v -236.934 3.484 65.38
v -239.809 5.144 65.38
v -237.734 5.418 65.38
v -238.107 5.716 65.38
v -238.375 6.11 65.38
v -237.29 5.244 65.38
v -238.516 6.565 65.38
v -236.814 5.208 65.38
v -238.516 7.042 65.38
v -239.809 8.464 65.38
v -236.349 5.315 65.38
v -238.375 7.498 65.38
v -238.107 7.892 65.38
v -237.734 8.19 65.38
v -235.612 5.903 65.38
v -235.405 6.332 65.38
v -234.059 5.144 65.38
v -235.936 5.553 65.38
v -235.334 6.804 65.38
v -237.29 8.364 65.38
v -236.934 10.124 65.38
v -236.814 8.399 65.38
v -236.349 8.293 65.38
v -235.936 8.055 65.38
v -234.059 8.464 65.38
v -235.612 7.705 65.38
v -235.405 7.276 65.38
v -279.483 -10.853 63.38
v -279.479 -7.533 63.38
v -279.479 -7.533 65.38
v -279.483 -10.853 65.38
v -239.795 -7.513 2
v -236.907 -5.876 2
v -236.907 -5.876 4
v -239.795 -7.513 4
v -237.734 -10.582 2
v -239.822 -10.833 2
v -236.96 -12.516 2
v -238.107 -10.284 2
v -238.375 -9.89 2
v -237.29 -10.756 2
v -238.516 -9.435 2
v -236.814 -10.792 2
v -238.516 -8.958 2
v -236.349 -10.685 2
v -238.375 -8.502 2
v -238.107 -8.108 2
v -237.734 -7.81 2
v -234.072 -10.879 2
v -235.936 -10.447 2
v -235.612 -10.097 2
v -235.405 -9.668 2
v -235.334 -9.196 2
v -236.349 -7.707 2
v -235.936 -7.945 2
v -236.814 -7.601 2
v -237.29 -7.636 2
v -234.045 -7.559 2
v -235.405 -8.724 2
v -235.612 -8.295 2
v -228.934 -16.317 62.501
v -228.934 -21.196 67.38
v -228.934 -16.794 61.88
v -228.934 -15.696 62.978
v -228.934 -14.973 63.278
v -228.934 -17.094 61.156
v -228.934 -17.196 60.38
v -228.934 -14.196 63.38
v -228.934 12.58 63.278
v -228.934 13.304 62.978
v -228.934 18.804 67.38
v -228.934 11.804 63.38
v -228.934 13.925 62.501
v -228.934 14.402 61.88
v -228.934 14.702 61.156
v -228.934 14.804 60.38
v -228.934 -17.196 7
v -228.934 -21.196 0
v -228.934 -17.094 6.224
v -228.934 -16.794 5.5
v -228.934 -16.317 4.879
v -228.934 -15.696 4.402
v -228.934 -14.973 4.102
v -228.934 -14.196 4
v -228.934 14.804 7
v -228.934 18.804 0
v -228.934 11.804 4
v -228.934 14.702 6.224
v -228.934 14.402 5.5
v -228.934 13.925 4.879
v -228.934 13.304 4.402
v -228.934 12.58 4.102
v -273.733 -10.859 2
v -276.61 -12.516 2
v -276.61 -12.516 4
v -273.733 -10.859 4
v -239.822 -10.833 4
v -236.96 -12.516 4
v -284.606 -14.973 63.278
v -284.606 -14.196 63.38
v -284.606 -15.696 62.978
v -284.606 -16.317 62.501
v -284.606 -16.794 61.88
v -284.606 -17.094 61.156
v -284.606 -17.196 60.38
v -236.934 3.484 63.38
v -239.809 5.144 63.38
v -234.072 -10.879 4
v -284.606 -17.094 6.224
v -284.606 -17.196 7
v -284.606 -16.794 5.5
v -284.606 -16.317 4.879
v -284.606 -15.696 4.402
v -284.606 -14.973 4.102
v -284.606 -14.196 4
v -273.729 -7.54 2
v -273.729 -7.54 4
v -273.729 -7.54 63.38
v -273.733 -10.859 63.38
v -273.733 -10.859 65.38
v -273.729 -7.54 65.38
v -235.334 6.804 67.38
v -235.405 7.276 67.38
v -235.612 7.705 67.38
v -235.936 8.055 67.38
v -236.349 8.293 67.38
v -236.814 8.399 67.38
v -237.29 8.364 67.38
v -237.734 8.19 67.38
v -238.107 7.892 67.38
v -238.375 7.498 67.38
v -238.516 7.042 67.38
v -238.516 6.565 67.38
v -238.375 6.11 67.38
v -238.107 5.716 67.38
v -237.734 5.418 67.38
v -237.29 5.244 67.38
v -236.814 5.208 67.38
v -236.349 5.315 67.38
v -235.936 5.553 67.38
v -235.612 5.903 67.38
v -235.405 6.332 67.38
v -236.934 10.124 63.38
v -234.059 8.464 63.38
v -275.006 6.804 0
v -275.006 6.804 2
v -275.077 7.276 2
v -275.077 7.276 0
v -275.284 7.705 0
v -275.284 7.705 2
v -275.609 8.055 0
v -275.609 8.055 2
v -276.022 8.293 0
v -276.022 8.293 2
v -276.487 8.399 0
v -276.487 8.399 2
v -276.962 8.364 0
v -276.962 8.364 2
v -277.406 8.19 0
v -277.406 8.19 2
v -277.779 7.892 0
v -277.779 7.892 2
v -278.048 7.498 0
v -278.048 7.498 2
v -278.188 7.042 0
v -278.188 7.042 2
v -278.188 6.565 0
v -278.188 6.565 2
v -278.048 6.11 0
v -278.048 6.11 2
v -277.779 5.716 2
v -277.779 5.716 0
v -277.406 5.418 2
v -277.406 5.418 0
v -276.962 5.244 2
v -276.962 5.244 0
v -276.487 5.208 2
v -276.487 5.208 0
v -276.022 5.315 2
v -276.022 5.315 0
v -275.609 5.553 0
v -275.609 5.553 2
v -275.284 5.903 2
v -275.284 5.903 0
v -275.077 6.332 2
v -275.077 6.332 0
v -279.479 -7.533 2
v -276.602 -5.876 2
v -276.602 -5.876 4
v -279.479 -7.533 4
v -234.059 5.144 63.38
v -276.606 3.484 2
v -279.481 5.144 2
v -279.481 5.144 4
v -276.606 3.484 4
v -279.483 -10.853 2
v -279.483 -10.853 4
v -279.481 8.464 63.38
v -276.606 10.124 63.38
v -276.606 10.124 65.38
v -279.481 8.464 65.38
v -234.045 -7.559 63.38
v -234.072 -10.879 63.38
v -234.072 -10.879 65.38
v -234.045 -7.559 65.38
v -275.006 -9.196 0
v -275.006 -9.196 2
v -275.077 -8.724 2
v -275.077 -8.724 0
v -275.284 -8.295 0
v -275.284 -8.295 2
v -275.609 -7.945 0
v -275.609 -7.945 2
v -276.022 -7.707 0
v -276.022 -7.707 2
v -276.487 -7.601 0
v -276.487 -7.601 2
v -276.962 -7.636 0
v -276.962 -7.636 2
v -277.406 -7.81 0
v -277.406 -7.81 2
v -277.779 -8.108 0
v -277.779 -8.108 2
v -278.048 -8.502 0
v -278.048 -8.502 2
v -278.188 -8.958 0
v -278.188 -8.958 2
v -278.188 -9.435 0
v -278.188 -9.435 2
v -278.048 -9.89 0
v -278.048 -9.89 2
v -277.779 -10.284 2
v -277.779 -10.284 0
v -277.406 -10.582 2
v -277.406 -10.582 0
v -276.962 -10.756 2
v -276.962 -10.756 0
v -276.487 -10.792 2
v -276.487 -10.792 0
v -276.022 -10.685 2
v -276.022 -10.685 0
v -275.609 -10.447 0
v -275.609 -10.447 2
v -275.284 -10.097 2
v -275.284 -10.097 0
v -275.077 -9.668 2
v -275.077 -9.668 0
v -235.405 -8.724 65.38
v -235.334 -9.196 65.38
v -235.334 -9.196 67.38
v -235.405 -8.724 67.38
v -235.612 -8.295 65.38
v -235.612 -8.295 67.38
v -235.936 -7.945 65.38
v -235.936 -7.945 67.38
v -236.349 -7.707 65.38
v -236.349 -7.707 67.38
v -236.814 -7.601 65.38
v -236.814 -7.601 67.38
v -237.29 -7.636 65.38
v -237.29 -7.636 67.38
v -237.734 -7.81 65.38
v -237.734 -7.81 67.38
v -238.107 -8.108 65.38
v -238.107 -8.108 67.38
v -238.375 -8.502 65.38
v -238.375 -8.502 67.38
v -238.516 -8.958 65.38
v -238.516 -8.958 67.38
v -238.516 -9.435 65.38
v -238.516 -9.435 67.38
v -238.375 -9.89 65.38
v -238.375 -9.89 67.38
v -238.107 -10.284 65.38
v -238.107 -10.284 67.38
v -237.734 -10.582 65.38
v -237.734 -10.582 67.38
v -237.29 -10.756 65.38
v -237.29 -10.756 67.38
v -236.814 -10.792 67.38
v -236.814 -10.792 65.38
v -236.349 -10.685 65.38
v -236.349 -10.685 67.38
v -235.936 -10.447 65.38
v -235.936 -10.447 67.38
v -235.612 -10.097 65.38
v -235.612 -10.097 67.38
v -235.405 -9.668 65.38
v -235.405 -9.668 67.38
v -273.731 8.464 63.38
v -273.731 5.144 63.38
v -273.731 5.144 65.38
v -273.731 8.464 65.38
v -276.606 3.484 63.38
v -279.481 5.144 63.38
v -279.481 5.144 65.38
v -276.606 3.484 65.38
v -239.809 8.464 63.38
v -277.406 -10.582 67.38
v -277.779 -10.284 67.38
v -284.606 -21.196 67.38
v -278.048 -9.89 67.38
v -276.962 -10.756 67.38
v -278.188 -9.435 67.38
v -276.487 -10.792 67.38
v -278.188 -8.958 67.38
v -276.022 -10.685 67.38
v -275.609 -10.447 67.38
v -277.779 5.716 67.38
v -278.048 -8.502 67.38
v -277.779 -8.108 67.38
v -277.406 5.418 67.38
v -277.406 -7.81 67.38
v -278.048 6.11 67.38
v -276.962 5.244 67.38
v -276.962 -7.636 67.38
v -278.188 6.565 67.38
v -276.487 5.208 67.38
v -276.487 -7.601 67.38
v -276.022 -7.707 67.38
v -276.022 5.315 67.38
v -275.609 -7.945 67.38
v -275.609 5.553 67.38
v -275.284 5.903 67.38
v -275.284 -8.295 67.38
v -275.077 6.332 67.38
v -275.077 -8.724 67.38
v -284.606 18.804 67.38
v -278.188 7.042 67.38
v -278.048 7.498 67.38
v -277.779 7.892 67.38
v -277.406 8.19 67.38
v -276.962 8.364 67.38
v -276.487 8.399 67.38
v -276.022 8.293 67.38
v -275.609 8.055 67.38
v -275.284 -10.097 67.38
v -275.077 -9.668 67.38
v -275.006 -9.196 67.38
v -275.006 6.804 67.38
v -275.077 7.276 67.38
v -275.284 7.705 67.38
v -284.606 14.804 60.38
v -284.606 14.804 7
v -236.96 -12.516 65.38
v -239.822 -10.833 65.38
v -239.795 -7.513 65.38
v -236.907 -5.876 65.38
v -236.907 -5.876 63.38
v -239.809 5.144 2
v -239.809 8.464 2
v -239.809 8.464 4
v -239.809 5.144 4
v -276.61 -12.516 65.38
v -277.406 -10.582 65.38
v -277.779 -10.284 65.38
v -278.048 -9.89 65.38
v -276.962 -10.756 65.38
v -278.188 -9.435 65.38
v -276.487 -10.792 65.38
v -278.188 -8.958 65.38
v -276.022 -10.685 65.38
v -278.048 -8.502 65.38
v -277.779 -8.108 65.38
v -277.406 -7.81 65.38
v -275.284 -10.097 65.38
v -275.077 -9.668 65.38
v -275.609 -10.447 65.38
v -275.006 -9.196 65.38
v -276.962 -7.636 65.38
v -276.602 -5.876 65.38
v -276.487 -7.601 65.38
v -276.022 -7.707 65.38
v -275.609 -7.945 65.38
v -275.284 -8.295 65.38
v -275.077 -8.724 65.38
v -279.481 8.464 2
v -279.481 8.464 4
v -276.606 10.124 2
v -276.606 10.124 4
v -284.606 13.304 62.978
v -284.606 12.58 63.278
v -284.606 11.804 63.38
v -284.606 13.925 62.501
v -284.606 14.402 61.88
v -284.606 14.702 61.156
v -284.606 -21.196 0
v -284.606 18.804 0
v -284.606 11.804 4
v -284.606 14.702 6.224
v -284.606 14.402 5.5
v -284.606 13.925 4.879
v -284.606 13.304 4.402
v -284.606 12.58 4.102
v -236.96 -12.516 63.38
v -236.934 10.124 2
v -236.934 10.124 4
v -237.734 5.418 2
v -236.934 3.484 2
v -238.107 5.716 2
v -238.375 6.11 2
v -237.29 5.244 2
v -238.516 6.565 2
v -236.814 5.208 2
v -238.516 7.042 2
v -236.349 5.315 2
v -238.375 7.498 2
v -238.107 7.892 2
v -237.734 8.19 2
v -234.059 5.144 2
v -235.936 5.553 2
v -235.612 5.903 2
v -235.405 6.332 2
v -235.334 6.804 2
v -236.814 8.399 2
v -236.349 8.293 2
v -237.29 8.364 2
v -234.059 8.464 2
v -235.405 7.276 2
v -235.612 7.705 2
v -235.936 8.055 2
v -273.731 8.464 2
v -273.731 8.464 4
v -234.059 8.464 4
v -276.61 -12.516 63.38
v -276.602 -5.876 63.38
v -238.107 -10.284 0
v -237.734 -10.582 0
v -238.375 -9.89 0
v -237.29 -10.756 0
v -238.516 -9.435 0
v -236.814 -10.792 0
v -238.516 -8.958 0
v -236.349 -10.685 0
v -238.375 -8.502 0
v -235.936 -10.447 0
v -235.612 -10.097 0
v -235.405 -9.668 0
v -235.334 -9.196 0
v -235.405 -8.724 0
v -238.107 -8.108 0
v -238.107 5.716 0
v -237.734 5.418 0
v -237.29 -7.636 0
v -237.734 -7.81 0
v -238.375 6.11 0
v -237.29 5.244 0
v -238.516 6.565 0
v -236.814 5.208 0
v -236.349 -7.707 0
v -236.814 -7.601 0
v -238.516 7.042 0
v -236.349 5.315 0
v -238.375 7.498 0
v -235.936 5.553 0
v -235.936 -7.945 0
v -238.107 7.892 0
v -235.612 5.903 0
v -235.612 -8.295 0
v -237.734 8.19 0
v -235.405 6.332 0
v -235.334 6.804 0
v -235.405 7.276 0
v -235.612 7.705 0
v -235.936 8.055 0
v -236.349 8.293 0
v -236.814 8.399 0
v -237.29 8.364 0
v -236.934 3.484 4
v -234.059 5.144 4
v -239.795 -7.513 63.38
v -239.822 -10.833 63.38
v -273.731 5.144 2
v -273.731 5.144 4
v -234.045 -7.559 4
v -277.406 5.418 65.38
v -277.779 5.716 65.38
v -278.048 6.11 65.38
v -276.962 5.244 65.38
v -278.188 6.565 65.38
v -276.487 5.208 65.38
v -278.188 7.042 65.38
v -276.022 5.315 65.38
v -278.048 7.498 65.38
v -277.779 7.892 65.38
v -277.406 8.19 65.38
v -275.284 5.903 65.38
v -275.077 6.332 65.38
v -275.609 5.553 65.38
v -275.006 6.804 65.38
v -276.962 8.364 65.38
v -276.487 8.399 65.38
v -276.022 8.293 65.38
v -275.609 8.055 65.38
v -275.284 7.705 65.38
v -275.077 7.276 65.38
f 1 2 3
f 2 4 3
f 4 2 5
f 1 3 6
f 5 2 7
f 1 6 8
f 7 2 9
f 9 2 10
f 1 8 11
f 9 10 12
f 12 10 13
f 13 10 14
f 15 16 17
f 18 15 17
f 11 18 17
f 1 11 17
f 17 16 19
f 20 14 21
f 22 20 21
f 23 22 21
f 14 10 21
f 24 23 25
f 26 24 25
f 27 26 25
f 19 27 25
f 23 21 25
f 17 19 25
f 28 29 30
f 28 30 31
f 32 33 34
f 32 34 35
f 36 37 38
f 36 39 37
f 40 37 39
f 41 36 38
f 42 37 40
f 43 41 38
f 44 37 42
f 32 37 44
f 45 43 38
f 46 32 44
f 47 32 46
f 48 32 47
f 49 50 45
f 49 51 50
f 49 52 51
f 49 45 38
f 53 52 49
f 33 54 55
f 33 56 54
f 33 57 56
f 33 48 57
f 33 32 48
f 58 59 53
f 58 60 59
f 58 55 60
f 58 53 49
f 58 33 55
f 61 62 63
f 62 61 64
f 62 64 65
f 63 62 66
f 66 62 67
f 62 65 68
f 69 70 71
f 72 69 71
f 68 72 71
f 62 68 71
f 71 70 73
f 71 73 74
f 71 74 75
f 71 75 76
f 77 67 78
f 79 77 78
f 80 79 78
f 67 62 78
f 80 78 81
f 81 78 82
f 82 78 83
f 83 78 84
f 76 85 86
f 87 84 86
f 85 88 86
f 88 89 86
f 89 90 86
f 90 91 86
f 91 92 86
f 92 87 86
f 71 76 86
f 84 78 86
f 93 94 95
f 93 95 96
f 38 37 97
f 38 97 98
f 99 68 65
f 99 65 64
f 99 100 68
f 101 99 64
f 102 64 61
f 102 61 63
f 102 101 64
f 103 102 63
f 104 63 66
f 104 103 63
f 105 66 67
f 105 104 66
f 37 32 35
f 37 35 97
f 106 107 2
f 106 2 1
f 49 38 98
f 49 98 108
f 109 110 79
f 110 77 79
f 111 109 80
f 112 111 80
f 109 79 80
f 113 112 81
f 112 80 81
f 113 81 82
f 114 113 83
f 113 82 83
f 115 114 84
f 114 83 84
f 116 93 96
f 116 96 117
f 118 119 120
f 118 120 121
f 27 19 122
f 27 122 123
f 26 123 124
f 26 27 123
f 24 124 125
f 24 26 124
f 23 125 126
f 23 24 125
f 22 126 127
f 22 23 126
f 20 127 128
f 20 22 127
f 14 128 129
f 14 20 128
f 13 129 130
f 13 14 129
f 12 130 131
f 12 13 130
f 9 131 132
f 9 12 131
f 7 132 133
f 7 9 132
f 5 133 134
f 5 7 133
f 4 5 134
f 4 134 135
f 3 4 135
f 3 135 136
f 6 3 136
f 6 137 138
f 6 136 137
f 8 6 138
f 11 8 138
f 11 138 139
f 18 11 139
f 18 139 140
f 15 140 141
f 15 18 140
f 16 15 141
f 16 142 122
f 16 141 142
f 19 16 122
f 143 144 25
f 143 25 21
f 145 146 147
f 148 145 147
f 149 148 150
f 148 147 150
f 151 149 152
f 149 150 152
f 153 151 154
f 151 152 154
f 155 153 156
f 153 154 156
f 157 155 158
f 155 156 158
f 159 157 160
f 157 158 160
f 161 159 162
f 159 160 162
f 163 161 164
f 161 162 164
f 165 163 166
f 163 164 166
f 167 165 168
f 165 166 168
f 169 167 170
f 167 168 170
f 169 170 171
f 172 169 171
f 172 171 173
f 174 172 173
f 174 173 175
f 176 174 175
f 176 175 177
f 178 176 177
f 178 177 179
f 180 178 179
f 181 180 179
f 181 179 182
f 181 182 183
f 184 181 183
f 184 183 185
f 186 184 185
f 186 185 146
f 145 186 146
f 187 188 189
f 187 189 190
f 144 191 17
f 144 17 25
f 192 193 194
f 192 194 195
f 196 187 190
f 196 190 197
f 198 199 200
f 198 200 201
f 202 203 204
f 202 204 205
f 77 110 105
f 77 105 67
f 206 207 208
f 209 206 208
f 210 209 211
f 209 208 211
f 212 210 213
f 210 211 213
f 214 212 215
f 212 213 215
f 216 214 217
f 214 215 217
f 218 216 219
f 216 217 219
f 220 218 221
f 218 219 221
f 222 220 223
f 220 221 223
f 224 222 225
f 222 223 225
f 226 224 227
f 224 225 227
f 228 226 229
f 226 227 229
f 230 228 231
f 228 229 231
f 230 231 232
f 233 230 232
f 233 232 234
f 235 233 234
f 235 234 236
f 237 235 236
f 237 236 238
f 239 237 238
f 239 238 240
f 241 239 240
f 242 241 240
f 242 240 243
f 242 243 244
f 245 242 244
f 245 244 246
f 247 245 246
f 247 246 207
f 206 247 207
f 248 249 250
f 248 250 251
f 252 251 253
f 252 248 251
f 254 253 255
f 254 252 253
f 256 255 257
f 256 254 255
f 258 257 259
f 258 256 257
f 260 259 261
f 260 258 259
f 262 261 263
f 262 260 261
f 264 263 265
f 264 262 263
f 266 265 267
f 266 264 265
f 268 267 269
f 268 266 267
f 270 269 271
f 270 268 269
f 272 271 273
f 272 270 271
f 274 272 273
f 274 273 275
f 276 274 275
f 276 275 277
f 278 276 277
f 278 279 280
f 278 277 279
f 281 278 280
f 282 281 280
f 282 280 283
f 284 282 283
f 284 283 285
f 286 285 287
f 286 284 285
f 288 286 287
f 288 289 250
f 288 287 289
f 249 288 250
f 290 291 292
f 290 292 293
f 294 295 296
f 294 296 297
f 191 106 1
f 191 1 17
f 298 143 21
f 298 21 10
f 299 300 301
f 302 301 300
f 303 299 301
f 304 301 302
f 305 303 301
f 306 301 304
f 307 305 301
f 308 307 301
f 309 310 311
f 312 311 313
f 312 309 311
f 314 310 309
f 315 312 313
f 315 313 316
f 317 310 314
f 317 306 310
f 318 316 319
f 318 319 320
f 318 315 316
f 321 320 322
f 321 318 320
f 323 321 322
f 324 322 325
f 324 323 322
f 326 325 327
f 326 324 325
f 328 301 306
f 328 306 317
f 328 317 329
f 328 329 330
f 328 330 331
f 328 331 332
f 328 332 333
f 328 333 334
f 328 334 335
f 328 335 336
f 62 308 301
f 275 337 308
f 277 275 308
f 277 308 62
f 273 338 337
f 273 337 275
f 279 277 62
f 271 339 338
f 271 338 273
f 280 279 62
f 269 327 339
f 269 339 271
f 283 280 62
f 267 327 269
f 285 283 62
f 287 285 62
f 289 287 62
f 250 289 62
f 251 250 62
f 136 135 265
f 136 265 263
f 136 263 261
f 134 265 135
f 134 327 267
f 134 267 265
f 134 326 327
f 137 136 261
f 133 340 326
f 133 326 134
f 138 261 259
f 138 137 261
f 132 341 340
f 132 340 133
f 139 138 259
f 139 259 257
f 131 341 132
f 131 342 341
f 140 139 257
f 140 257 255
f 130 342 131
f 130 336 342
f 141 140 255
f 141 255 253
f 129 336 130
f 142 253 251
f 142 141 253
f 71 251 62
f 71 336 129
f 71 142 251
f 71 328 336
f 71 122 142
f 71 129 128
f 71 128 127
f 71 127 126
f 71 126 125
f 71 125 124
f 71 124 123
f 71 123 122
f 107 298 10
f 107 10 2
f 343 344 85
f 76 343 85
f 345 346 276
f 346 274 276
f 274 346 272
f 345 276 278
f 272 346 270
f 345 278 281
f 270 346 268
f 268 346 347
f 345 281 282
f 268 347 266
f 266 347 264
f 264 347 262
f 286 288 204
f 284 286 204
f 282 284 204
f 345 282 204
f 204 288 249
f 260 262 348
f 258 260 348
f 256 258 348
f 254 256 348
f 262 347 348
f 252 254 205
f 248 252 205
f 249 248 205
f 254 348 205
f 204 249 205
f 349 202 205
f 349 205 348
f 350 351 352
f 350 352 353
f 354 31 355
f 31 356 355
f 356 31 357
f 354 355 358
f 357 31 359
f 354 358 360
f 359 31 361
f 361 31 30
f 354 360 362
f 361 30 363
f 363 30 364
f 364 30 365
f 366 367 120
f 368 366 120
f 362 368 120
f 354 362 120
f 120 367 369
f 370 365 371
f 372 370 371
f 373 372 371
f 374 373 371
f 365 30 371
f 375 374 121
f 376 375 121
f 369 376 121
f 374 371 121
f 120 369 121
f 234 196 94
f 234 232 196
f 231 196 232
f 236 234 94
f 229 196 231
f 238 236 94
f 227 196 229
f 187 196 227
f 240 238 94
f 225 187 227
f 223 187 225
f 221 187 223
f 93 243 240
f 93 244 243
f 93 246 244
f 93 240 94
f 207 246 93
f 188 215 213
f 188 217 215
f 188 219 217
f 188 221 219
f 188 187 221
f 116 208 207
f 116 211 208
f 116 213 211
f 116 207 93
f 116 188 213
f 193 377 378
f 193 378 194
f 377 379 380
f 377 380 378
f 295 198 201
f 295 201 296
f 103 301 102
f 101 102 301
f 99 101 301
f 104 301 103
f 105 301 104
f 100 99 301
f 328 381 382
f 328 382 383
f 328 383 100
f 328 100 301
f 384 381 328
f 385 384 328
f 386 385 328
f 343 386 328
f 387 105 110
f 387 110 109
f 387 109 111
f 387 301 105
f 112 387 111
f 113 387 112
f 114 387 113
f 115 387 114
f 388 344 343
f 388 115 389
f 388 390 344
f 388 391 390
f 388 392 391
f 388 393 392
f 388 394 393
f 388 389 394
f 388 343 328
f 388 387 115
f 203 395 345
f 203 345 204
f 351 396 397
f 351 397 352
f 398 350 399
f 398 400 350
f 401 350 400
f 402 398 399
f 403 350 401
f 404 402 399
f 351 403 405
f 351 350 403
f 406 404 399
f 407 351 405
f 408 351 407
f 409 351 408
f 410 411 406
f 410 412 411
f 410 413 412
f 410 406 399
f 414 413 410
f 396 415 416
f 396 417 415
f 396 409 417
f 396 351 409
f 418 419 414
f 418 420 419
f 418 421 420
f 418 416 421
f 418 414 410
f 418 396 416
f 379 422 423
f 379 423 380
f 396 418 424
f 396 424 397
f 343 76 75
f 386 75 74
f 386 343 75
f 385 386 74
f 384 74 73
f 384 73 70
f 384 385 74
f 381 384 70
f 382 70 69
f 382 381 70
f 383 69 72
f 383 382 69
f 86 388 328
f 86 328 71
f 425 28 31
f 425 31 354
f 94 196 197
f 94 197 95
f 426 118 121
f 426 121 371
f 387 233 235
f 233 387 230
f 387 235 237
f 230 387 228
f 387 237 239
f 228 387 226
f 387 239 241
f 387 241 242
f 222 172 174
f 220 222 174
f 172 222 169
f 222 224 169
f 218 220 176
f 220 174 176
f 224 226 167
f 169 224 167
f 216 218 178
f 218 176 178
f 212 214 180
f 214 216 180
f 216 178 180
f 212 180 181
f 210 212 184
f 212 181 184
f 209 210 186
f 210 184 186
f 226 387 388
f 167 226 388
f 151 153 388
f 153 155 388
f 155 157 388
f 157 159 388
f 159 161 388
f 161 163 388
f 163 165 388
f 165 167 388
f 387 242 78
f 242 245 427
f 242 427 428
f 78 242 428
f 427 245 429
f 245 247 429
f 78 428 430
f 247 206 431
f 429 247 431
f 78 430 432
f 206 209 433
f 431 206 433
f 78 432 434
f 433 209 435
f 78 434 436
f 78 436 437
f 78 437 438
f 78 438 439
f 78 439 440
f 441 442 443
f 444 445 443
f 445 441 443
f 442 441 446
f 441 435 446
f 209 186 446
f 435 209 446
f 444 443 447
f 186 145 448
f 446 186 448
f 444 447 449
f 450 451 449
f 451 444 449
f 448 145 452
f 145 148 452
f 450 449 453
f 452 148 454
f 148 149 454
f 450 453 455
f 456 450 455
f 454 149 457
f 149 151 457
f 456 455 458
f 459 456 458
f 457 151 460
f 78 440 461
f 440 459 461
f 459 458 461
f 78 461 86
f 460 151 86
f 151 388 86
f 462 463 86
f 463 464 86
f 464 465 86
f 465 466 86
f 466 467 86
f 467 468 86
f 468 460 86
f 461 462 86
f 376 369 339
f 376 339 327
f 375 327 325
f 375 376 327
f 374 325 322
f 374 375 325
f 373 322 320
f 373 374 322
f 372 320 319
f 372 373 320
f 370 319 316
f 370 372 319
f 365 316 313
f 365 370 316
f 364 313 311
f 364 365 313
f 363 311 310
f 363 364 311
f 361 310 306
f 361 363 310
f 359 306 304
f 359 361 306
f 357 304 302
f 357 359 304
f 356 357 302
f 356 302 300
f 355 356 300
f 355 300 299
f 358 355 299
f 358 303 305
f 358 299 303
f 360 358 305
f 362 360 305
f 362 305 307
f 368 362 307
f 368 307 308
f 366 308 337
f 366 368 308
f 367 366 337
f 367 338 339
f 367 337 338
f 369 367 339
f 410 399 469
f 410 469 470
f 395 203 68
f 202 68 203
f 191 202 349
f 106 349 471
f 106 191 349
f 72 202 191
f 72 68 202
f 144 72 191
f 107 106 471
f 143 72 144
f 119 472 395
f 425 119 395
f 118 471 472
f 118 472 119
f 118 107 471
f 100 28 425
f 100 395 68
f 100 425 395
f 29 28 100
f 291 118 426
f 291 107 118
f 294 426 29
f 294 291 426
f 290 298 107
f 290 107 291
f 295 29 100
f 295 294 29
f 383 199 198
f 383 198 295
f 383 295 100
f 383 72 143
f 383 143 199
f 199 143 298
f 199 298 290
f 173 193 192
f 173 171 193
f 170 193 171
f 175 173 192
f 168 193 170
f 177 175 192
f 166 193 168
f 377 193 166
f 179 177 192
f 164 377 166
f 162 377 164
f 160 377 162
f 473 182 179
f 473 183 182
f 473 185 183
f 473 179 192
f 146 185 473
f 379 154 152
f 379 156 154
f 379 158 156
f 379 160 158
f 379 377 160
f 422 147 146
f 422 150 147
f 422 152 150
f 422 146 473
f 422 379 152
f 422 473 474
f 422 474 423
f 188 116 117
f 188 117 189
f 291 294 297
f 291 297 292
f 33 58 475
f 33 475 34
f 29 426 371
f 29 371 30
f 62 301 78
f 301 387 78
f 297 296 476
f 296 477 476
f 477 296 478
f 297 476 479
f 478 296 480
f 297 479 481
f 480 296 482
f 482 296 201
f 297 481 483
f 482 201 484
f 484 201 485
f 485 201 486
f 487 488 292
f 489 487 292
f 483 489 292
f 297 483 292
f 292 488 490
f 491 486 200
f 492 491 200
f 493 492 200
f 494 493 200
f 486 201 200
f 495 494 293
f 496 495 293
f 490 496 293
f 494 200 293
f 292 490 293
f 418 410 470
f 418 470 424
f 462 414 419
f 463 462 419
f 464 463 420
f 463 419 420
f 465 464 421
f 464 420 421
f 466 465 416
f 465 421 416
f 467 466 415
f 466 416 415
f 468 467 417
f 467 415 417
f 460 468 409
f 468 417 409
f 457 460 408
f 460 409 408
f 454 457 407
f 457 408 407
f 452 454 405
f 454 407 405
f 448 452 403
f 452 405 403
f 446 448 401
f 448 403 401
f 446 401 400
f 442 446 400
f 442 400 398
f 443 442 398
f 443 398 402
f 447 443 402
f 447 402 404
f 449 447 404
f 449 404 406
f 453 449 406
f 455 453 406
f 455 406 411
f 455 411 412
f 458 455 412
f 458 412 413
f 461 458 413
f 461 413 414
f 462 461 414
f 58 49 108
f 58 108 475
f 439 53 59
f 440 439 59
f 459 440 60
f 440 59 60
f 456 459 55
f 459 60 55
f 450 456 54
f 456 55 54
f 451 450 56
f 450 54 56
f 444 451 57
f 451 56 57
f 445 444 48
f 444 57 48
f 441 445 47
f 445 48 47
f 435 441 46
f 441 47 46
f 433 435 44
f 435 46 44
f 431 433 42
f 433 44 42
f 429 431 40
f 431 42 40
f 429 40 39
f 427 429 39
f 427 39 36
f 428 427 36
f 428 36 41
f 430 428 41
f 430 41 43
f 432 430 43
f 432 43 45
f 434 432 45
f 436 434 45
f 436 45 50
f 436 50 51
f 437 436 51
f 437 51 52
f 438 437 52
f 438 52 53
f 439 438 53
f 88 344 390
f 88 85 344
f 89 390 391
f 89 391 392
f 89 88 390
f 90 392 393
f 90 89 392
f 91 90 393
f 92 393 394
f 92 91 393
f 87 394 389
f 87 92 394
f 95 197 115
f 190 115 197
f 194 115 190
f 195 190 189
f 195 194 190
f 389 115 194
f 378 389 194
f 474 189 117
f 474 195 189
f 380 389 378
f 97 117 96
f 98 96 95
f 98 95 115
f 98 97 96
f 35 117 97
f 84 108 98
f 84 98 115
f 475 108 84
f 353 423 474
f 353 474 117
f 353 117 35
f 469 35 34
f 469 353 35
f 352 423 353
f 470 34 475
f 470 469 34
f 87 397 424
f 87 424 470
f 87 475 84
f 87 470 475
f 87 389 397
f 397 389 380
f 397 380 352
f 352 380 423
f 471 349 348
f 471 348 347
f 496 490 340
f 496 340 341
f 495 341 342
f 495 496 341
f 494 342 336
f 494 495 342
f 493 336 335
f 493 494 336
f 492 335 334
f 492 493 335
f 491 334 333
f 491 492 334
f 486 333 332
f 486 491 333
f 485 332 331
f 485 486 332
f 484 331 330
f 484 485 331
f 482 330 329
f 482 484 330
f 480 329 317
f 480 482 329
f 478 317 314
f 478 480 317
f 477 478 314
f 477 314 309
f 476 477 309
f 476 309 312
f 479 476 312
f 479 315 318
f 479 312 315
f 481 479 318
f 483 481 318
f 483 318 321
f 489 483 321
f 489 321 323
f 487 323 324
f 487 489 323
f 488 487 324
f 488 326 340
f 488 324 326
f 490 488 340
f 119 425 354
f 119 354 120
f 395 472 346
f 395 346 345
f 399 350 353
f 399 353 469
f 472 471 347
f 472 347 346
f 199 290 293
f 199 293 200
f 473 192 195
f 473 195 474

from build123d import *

# Parameters (mm, degrees)
SKETCH1_W               = 55.67262225
SKETCH1_H               = 40
BOSS_EXTRUDE1_DEPTH     = 4
SKETCH2_W               = 55.67262225
SKETCH2_H               = 4
BOSS_EXTRUDE2_DEPTH     = 63.38
SKETCH3_W               = 55.67262225
SKETCH3_H               = 40
BOSS_EXTRUDE3_DEPTH     = 4
SKETCH4_R               = 1.6
CUT_EXTRUDE1_DEPTH      = 64.38
CUT_EXTRUDE1_DEPTH_BACK = 5
CUT_EXTRUDE2_START      = -2
CUT_EXTRUDE2_DEPTH      = 63.38
FILLET1_R               = 3


with BuildPart() as part:
    # Sketch1 → Boss-Extrude1 (new body)
    with BuildSketch(Plane.XY):
        with Locations((-256.769960814, -1.19608299)):
            Rectangle(SKETCH1_W, SKETCH1_H)
    extrude(amount=BOSS_EXTRUDE1_DEPTH)

    # Sketch2 → Boss-Extrude2 (add)
    with BuildSketch(Plane.XY.offset(4)):
        with Locations((-256.769960814, -19.19608299)):
            Rectangle(SKETCH2_W, SKETCH2_H)
        with Locations((-256.769960814, 16.80391701)):
            Rectangle(SKETCH2_W, SKETCH2_H)
    extrude(amount=BOSS_EXTRUDE2_DEPTH)

    # Sketch3 → Boss-Extrude3 (add)
    with BuildSketch(Plane(origin=(0, 0, 67.38), x_dir=(-1, 0, 0), z_dir=(0, 0, -1))):
        with Locations((256.769960814, -1.19608299)):
            Rectangle(SKETCH3_W, SKETCH3_H)
    extrude(amount=BOSS_EXTRUDE3_DEPTH)

    # Sketch4 → Cut-Extrude1 (cut, two sides)
    with BuildSketch(Plane.XY.offset(4)) as cut_extrude1_sk:
        with Locations((-276.606271939, -9.19608299)):
            Circle(SKETCH4_R)
        with Locations((-276.606271939, 6.80391701)):
            Circle(SKETCH4_R)
        with Locations((-236.933649689, 6.80391701)):
            Circle(SKETCH4_R)
        with Locations((-236.933649689, -9.19608299)):
            Circle(SKETCH4_R)
    extrude(amount=CUT_EXTRUDE1_DEPTH, mode=Mode.SUBTRACT)
    extrude(cut_extrude1_sk.sketch, amount=-CUT_EXTRUDE1_DEPTH_BACK, mode=Mode.SUBTRACT)

    # Sketch5 → Cut-Extrude2 (cut)
    with BuildSketch(Plane.XY.offset(4).offset(CUT_EXTRUDE2_START)):
        Polygon((-276.602416628, -5.876321181), (-279.479342345, -7.532863288), (-279.483197655, -10.852625098), (-276.610127249, -12.515844799), (-273.733201533, -10.859302692), (-273.729346222, -7.539540882), align=None)
        Polygon((-276.606181369, 10.123681057), (-279.481226653, 8.463877469), (-279.481317222, 5.144113422), (-276.606362508, 3.484152963), (-273.731317224, 5.143956551), (-273.731226655, 8.463720598), align=None)
        Polygon((-236.907079951, -5.876425269), (-239.795272738, -7.513244061), (-239.821842476, -10.832901782), (-236.960219427, -12.515740711), (-234.07202664, -10.878921919), (-234.045456902, -7.559264198), align=None)
        Polygon((-236.933649689, 10.123681058), (-239.808649689, 8.463799034), (-239.808649689, 5.144034986), (-236.933649689, 3.484152962), (-234.058649689, 5.144034986), (-234.058649689, 8.463799034), align=None)
    extrude(amount=CUT_EXTRUDE2_DEPTH, mode=Mode.SUBTRACT)

    # Fillet1
    fillet1_edges = [part.edges().sort_by_distance(p)[0] for p in [
        (-256.769960814, -17.19608299, 4),
        (-256.769960814, 14.80391701, 4),
        (-256.769960814, -17.19608299, 63.38),
        (-256.769960814, 14.80391701, 63.38),
    ]]
    fillet(fillet1_edges, radius=FILLET1_R)


solid = part.part
